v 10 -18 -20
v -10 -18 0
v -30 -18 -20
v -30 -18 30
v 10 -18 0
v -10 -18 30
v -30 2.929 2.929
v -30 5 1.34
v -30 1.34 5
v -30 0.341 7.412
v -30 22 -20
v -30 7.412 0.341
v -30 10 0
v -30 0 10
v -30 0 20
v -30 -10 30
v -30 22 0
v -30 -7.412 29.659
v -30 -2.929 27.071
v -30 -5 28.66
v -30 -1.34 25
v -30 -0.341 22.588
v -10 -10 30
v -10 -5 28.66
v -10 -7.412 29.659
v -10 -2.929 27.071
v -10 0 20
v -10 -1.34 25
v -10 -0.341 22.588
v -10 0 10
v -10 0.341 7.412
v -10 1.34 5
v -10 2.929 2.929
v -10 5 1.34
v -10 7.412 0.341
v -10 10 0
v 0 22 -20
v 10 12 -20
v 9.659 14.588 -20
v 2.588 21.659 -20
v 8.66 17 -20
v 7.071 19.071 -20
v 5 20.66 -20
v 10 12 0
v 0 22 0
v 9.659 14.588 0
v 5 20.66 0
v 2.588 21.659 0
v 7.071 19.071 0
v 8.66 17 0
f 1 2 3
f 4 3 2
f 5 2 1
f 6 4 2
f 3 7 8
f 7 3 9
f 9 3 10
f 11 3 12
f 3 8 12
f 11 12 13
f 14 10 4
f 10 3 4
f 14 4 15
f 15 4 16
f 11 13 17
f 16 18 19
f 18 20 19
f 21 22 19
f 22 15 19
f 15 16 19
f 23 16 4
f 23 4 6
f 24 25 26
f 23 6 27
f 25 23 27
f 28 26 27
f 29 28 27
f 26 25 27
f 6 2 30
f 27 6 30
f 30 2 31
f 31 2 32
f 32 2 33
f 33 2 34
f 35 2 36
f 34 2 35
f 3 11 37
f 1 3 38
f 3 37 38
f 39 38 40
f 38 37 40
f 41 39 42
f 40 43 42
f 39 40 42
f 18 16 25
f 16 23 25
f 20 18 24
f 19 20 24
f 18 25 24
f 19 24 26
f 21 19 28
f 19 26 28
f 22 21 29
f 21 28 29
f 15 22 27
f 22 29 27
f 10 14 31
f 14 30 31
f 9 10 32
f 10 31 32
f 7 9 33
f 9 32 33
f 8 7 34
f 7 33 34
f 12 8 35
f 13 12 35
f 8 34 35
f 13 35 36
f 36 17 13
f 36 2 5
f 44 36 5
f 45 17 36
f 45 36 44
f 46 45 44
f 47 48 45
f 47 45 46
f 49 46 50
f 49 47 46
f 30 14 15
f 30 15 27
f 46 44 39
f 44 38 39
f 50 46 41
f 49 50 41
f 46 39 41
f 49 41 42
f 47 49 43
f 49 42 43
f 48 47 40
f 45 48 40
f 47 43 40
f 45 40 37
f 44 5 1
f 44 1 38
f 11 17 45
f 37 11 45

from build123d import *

# Parameters (mm, degrees)
SKETCH1_W           = 20
SKETCH1_H           = 18
BOSS_EXTRUDE1_DEPTH = 30
SKETCH2_W           = 40
SKETCH2_H           = 40
BOSS_EXTRUDE2_DEPTH = 20
FILLET1_R           = 10


with BuildPart() as part:
    # Sketch1 → Boss-Extrude1 (new body)
    with BuildSketch(Plane.XY):
        with Locations((-20, -9)):
            Rectangle(SKETCH1_W, SKETCH1_H)
    extrude(amount=BOSS_EXTRUDE1_DEPTH)

    # Sketch2 → Boss-Extrude2 (add)
    with BuildSketch(Plane.XY):
        with Locations((-10, 2)):
            Rectangle(SKETCH2_W, SKETCH2_H)
    extrude(amount=-BOSS_EXTRUDE2_DEPTH)

    # Fillet1
    fillet1_edges = [part.edges().sort_by_distance(p)[0] for p in [
        (10, 22, -10),
        (-20, 0, 30),
        (-20, 0, 0),
    ]]
    fillet(fillet1_edges, radius=FILLET1_R)


solid = part.part
